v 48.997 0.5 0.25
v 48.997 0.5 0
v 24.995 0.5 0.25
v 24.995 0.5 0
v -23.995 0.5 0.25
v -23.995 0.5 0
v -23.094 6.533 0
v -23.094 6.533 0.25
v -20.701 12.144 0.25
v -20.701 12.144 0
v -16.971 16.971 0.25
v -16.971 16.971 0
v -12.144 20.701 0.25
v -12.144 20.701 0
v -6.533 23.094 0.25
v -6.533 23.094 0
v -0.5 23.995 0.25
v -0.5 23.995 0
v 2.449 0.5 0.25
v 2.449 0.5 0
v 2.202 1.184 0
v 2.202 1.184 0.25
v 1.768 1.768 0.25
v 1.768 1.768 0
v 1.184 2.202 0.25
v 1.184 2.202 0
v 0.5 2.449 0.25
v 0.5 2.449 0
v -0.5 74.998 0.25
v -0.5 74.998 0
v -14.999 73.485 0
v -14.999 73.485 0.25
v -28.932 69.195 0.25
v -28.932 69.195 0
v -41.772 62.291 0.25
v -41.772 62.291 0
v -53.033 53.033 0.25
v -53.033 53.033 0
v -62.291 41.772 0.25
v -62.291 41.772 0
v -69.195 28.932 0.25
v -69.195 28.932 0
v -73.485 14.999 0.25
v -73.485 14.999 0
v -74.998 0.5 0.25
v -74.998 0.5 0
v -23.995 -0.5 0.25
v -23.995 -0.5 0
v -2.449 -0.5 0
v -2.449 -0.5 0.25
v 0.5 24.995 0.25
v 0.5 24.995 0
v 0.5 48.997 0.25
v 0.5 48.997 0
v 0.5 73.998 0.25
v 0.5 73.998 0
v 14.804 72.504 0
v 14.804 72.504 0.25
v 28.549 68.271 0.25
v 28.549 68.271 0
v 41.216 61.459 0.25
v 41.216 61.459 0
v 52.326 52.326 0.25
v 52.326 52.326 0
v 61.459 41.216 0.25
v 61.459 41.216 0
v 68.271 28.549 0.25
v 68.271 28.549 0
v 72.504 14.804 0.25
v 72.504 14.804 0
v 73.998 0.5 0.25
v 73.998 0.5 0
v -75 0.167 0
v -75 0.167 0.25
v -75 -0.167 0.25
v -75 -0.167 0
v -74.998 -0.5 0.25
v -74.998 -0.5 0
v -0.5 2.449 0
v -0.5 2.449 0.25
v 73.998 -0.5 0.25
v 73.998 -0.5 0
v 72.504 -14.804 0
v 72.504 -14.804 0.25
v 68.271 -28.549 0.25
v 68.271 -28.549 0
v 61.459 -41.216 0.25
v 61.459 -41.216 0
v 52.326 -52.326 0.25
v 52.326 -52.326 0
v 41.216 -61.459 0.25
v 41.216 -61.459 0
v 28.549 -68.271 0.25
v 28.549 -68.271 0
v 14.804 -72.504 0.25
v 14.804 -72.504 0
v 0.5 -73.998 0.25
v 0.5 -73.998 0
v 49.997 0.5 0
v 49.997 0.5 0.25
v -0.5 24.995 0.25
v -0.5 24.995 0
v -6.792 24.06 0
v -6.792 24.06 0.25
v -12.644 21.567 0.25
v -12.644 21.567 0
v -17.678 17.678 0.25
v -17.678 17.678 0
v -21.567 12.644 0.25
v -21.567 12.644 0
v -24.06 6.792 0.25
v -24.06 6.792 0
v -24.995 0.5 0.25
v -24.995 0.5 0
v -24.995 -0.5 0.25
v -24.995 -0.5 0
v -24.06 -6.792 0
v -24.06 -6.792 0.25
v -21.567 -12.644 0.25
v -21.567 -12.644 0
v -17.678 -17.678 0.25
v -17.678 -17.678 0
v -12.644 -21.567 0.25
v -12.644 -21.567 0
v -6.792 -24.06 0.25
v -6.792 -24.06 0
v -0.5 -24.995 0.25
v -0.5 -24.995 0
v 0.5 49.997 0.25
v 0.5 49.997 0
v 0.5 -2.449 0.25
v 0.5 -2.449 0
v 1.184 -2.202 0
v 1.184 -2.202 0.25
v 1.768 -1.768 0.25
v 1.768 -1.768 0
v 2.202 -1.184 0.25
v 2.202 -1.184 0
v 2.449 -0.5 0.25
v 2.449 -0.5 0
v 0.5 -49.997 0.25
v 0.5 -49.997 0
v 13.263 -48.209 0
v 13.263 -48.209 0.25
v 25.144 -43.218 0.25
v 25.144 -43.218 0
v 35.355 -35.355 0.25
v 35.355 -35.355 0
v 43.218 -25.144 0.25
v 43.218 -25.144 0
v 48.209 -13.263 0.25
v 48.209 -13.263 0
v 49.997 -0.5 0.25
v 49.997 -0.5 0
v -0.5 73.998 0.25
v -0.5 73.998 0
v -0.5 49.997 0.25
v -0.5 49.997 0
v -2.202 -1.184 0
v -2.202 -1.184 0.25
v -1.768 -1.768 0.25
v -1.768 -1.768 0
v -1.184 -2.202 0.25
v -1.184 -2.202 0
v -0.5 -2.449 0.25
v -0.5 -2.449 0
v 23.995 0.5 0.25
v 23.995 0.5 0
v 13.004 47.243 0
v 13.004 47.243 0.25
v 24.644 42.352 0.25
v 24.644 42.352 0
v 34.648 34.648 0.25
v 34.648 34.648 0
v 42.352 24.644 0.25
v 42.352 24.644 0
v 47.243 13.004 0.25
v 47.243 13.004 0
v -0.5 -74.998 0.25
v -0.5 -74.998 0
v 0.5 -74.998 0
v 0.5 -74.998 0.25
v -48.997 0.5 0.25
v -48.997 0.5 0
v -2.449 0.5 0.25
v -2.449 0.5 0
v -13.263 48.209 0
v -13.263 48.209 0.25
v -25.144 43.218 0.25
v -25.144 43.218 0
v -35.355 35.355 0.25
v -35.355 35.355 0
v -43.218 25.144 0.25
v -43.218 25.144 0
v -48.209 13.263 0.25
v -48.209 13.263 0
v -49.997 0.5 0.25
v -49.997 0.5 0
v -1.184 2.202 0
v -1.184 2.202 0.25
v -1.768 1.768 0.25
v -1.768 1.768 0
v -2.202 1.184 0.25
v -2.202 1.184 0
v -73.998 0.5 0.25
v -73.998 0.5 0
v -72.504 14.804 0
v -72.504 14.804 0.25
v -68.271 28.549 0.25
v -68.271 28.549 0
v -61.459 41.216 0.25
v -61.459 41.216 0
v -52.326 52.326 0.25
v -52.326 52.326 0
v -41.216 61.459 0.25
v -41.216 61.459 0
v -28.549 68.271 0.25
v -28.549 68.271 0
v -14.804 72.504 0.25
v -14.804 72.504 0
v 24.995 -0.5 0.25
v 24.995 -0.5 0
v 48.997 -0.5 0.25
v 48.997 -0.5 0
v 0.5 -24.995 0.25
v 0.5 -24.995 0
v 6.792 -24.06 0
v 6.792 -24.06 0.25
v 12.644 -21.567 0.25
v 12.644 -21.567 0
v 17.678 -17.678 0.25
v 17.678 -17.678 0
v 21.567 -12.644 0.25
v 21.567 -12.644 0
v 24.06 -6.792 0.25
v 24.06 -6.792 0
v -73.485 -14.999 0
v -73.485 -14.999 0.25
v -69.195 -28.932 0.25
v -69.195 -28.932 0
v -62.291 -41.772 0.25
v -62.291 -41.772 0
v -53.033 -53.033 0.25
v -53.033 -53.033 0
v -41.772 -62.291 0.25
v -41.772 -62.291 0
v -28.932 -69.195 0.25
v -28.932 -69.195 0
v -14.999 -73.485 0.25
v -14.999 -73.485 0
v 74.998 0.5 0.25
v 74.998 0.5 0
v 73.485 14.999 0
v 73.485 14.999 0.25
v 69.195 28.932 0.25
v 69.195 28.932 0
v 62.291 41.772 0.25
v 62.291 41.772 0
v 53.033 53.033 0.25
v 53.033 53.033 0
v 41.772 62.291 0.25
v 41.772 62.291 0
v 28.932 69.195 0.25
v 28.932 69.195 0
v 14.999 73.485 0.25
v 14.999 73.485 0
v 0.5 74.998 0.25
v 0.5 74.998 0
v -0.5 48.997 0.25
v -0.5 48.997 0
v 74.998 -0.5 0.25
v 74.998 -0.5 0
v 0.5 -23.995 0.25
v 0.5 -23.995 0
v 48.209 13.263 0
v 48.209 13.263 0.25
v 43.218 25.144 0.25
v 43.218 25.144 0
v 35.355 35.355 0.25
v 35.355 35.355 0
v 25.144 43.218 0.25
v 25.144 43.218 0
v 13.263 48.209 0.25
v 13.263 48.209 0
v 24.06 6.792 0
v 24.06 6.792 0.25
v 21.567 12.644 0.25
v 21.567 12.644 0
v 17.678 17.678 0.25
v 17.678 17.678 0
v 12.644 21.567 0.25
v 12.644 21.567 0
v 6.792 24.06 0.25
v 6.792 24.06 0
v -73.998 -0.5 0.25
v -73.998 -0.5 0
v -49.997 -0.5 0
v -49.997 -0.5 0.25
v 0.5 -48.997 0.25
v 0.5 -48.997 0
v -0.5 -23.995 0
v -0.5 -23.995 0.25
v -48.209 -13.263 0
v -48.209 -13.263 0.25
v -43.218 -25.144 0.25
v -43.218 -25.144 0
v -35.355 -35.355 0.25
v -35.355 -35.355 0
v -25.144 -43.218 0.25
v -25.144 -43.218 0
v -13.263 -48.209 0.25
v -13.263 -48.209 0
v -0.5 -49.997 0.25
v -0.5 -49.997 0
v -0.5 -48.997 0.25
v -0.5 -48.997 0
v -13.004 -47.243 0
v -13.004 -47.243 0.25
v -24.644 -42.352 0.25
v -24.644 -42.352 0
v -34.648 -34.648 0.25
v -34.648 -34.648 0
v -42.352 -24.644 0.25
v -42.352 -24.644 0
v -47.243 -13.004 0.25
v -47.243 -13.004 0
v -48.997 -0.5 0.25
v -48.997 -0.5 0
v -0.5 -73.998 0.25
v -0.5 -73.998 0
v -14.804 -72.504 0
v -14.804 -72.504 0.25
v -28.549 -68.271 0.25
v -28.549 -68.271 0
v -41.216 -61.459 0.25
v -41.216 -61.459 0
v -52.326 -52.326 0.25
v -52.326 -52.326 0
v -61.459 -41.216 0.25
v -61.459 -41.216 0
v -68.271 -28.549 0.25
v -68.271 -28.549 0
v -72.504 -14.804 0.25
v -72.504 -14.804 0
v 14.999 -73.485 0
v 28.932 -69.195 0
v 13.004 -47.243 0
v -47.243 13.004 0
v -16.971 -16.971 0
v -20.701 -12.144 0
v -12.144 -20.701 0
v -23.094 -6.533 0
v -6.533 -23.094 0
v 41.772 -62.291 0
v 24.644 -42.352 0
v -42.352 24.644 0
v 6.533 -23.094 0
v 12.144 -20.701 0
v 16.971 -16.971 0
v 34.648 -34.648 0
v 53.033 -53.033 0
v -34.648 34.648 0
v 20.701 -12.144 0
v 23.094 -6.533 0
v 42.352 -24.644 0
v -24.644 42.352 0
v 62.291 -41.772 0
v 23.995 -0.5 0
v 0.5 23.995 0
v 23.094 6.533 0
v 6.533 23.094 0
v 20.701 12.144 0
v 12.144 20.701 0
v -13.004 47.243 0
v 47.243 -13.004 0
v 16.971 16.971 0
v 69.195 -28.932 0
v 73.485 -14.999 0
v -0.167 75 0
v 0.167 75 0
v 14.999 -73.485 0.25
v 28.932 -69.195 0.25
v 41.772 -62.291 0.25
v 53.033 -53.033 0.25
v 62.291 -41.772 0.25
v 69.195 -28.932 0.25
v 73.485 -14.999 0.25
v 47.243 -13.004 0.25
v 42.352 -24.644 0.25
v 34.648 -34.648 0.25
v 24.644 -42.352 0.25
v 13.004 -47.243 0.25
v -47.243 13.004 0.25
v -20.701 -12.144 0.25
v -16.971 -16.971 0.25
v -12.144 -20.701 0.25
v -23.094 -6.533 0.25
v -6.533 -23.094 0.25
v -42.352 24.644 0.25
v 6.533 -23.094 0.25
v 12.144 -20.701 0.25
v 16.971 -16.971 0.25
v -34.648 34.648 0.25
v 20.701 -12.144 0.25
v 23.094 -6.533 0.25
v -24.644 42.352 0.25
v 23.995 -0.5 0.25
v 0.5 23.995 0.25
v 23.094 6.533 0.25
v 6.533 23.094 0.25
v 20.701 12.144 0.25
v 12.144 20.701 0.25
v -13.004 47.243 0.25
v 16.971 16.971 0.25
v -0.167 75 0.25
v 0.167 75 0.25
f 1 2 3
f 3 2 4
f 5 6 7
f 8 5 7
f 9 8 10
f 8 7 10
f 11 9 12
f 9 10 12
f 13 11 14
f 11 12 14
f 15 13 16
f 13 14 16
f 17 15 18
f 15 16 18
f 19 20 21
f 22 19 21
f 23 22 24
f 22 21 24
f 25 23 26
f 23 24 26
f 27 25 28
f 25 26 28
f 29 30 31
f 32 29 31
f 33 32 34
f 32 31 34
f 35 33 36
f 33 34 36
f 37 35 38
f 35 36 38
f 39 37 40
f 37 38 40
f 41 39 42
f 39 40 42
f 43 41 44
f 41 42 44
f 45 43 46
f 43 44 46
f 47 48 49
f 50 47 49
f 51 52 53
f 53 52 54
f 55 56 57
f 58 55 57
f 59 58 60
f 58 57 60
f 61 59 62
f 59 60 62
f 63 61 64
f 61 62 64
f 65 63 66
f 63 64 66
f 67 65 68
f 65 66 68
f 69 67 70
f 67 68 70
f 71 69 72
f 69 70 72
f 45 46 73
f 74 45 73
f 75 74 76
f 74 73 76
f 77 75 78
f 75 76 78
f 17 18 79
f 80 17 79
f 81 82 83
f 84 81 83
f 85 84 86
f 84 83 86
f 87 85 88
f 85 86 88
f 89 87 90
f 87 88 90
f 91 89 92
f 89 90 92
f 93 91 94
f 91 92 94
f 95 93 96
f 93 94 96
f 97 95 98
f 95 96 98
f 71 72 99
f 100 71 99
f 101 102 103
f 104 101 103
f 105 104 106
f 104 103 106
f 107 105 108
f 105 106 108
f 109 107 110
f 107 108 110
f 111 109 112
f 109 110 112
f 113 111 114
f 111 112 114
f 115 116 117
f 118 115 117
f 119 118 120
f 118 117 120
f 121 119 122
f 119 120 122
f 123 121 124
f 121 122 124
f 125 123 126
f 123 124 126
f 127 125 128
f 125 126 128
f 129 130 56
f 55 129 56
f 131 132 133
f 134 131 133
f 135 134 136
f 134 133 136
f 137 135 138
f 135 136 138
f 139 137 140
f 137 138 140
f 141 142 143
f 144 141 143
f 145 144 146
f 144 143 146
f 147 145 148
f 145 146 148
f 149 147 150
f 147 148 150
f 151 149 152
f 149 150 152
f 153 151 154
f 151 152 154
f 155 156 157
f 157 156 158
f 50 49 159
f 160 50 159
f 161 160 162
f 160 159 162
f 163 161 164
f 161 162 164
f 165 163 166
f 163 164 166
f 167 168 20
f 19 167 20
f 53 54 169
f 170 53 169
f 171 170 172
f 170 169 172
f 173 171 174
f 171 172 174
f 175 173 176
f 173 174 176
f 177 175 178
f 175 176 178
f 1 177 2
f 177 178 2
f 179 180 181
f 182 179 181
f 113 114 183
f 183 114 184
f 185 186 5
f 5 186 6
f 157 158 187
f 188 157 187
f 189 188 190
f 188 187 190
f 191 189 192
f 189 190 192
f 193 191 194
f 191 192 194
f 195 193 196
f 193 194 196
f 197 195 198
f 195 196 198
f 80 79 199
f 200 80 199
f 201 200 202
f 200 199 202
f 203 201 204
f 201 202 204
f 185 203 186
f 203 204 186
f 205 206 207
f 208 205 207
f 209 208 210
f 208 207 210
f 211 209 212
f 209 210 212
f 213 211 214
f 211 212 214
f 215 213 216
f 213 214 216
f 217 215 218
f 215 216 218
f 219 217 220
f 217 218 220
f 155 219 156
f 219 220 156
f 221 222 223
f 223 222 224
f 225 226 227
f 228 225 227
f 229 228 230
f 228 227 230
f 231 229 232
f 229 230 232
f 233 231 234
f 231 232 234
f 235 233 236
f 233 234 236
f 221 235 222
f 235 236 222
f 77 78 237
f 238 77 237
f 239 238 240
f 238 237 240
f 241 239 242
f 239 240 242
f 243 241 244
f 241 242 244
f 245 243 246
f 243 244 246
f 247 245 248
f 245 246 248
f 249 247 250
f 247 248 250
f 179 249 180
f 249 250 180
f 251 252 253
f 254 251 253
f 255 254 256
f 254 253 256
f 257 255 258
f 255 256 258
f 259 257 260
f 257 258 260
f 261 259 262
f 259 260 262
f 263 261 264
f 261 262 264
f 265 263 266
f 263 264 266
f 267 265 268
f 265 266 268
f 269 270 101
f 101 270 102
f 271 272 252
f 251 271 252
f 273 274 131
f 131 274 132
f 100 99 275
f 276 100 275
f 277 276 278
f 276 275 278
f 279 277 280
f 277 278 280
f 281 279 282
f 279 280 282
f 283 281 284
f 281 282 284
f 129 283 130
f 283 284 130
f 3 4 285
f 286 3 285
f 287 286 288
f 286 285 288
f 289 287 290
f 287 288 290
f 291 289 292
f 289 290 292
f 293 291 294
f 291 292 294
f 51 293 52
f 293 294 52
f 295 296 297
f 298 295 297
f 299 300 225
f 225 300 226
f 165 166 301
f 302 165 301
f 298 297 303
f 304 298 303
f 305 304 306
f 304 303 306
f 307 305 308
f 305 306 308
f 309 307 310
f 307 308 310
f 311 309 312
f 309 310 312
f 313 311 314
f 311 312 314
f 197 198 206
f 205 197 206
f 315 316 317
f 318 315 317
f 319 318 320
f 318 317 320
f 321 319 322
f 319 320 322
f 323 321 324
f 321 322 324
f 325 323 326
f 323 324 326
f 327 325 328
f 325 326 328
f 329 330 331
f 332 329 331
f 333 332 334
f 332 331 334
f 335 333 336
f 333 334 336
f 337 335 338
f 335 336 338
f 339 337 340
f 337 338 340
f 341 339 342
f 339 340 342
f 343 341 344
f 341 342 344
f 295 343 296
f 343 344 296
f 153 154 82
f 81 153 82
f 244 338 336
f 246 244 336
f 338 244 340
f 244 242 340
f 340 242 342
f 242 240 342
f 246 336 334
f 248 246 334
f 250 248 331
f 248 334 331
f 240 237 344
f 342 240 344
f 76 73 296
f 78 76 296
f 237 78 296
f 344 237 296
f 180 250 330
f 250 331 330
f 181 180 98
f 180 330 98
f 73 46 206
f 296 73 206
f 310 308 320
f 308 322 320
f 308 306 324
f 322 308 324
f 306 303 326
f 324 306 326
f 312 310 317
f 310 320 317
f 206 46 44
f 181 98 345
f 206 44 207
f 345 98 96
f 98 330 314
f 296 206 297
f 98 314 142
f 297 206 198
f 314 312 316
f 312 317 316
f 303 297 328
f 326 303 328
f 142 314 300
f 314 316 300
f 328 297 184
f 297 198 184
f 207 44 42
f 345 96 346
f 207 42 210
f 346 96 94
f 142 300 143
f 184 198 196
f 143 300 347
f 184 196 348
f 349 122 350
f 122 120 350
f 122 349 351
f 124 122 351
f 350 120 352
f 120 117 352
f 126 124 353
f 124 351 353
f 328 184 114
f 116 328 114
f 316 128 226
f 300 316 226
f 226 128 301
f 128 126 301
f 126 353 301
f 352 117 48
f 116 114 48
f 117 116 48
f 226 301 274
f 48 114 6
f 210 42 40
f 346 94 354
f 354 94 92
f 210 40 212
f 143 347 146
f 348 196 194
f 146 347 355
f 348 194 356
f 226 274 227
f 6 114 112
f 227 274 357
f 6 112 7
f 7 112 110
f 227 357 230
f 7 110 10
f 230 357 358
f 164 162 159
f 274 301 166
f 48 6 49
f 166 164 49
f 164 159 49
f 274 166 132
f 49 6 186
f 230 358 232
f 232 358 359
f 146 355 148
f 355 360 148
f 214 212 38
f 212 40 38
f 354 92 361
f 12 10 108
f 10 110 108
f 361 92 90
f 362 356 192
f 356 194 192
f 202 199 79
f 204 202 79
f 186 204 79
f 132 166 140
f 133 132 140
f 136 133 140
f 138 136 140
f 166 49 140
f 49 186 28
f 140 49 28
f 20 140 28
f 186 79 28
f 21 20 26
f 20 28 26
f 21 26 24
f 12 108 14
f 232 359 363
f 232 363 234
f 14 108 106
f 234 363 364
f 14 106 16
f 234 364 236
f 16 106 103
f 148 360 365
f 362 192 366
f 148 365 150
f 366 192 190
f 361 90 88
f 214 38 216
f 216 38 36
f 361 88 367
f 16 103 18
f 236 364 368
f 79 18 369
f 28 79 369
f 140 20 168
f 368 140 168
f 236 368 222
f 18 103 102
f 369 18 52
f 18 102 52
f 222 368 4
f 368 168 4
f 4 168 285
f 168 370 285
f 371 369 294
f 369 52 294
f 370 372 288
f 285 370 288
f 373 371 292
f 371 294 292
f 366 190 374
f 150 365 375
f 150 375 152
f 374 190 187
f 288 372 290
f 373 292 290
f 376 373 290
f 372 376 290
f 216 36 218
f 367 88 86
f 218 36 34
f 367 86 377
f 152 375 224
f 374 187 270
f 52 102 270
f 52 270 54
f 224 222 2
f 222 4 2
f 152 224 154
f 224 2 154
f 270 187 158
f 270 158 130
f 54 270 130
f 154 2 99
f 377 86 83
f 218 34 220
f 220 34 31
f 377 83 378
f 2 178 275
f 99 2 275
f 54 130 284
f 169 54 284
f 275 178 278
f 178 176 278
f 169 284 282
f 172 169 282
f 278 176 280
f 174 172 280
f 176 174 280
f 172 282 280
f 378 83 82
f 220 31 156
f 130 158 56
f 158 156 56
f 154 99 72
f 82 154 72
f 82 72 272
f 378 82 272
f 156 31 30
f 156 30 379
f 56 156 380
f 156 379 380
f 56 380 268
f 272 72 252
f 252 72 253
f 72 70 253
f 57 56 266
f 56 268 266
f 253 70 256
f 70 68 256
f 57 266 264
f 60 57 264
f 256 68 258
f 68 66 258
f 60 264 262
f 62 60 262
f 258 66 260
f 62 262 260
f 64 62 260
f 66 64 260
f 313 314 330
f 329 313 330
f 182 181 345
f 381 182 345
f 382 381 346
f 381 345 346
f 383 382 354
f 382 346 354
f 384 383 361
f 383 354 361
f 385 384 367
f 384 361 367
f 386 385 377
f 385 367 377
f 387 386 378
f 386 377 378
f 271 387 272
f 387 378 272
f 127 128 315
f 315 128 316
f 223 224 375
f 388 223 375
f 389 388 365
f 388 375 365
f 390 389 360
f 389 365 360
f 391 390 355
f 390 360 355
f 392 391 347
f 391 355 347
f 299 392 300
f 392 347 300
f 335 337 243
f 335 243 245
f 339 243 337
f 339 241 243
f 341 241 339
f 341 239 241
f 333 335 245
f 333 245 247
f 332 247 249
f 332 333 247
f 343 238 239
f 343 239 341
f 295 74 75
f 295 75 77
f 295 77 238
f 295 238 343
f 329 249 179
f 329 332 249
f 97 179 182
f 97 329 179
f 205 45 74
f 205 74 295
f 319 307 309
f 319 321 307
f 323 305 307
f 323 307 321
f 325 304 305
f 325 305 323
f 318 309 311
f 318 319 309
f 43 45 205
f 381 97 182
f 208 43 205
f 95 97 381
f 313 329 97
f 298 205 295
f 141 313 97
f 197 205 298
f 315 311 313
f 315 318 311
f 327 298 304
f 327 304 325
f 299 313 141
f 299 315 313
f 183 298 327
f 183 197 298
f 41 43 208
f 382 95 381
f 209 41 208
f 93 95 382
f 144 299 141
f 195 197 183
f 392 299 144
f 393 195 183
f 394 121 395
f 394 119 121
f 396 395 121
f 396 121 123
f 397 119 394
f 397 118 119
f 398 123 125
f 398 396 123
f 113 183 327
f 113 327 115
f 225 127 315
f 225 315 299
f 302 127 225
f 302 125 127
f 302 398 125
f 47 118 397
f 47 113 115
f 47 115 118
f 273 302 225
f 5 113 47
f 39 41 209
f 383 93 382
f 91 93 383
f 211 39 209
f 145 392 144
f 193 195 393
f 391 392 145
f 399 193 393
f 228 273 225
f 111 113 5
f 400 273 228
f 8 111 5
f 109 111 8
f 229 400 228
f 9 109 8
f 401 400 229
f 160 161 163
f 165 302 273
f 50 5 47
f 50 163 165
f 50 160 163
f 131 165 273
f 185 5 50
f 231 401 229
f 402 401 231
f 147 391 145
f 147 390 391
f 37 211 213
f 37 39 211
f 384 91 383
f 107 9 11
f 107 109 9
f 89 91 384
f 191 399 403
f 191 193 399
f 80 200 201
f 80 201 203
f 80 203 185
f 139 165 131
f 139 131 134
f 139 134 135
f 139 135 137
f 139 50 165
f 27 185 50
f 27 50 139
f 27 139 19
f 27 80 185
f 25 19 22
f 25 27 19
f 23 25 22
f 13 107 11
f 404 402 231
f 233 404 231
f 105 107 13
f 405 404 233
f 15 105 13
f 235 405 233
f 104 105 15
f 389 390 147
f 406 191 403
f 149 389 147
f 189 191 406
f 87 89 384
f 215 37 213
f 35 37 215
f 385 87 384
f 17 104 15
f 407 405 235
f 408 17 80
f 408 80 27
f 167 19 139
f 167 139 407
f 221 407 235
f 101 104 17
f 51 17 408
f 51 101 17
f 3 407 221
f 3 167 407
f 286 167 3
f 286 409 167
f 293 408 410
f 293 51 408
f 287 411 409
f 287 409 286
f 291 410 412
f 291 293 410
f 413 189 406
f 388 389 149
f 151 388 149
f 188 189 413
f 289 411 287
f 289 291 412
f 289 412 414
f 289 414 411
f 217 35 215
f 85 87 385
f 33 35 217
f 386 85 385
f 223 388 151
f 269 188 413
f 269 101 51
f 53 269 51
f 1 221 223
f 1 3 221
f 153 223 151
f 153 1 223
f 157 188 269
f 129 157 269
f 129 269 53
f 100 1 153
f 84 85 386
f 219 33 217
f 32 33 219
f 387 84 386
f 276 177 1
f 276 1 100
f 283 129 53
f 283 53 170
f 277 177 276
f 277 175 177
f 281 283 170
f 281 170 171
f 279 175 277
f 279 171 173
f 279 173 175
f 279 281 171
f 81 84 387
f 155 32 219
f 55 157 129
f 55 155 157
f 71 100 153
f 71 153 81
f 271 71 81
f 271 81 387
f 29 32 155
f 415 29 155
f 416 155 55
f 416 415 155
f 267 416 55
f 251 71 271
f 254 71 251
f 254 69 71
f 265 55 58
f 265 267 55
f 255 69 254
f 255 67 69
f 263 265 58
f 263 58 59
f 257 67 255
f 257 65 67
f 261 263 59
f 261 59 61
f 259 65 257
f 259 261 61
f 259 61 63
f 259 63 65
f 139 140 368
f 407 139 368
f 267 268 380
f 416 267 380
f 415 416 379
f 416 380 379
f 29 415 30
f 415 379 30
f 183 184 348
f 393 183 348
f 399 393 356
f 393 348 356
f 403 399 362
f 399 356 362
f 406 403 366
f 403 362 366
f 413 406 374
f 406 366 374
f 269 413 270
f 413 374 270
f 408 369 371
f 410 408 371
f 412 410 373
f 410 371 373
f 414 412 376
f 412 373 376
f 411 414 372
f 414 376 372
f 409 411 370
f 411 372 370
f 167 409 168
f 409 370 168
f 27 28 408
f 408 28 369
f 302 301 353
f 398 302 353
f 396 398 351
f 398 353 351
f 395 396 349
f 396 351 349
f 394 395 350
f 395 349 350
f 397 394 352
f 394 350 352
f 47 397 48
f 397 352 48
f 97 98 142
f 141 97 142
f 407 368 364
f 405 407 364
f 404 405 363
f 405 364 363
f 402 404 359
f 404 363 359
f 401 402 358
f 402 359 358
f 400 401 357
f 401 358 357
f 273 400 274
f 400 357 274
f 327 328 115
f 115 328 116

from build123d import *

# Parameters (mm, degrees)
F1_DEPTH = 0.25


with BuildPart() as f1:
    # F0 (on Top) → F1 (new body)
    with BuildSketch(Plane.XY):
        with BuildLine():
            ThreePointArc((-0.5, -73.9983107915), (-52.3259018078, -52.3259018078), (-73.9983107915, -0.5))
            Line((-73.9983107915, -0.5), (-49.9974999375, -0.5))
            Line((-49.9974999375, -0.5), (-48.9974489132, -0.5))
            ThreePointArc((-48.9974489132, -0.5), (-49, 0), (-48.9974489132, 0.5))
            ThreePointArc((-48.9974489132, 0.5), (-34.6482322781, 34.6482322781), (-0.5, 48.9974489132))
            Line((-0.5, 48.9974489132), (-0.5, 49.9974999375))
            ThreePointArc((-0.5, 49.9974999375), (-35.3553390593, 35.3553390593), (-49.9974999375, 0.5))
            Line((-49.9974999375, 0.5), (-73.9983107915, 0.5))
            ThreePointArc((-73.9983107915, 0.5), (-52.3259018078, 52.3259018078), (-0.5, 73.9983107915))
            Line((-0.5, 73.9983107915), (-0.5, 74.9983333148))
            ThreePointArc((-0.5, 74.9983333148), (-53.033008589, 53.033008589), (-74.9983333148, 0.5))
            Line((-74.9983333148, 0.5), (-74.9983333148, -0.5))
            ThreePointArc((-74.9983333148, -0.5), (-53.033008589, -53.033008589), (-0.5, -74.9983333148))
            Line((-0.5, -74.9983333148), (-0.5, -73.9983107915))
        make_face()
        with BuildLine():
            Line((-0.5, -49.9974999375), (-0.5, -73.9983107915))
            ThreePointArc((-0.5, -73.9983107915), (0, -74), (0.5, -73.9983107915))
            Line((0.5, -73.9983107915), (0.5, -49.9974999375))
            ThreePointArc((0.5, -49.9974999375), (0, -50), (-0.5, -49.9974999375))
        make_face()
        with BuildLine():
            ThreePointArc((0.5, -73.9983107915), (0, -74), (-0.5, -73.9983107915))
            Line((-0.5, -73.9983107915), (-0.5, -74.9983333148))
            Line((-0.5, -74.9983333148), (0.5, -74.9983333148))
            Line((0.5, -74.9983333148), (0.5, -73.9983107915))
        make_face()
        with BuildLine():
            Line((-48.9974489132, -0.5), (-49.9974999375, -0.5))
            ThreePointArc((-49.9974999375, -0.5), (-35.3553390593, -35.3553390593), (-0.5, -49.9974999375))
            ThreePointArc((-0.5, -49.9974999375), (0, -50), (0.5, -49.9974999375))
            Line((0.5, -49.9974999375), (0.5, -48.9974489132))
            ThreePointArc((0.5, -48.9974489132), (0, -49), (-0.5, -48.9974489132))
            ThreePointArc((-0.5, -48.9974489132), (-34.6482322781, -34.6482322781), (-48.9974489132, -0.5))
        make_face()
        with BuildLine():
            ThreePointArc((73.9983107915, -0.5), (52.3259018078, -52.3259018078), (0.5, -73.9983107915))
            Line((0.5, -73.9983107915), (0.5, -74.9983333148))
            ThreePointArc((0.5, -74.9983333148), (53.033008589, -53.033008589), (74.9983333148, -0.5))
            Line((74.9983333148, -0.5), (73.9983107915, -0.5))
        make_face()
        with BuildLine():
            ThreePointArc((-48.9974489132, 0.5), (-49, 0), (-48.9974489132, -0.5))
            Line((-48.9974489132, -0.5), (-24.9949994999, -0.5))
            Line((-24.9949994999, -0.5), (-23.9947911014, -0.5))
            ThreePointArc((-23.9947911014, -0.5), (-24, 0), (-23.9947911014, 0.5))
            ThreePointArc((-23.9947911014, 0.5), (-16.9705627485, 16.9705627485), (-0.5, 23.9947911014))
            Line((-0.5, 23.9947911014), (-0.5, 24.9949994999))
            ThreePointArc((-0.5, 24.9949994999), (-17.6776695297, 17.6776695297), (-24.9949994999, 0.5))
            Line((-24.9949994999, 0.5), (-48.9974489132, 0.5))
        make_face()
        with BuildLine():
            Line((49.9974999375, -0.5), (73.9983107915, -0.5))
            ThreePointArc((73.9983107915, -0.5), (74, 0), (73.9983107915, 0.5))
            Line((73.9983107915, 0.5), (49.9974999375, 0.5))
            ThreePointArc((49.9974999375, 0.5), (50, 0), (49.9974999375, -0.5))
        make_face()
        with BuildLine():
            ThreePointArc((73.9983107915, 0.5), (74, 0), (73.9983107915, -0.5))
            Line((73.9983107915, -0.5), (74.9983333148, -0.5))
            Line((74.9983333148, -0.5), (74.9983333148, 0.5))
            Line((74.9983333148, 0.5), (73.9983107915, 0.5))
        make_face()
        with BuildLine():
            Line((0.5, -48.9974489132), (0.5, -49.9974999375))
            ThreePointArc((0.5, -49.9974999375), (35.3553390593, -35.3553390593), (49.9974999375, -0.5))
            Line((49.9974999375, -0.5), (48.9974489132, -0.5))
            ThreePointArc((48.9974489132, -0.5), (34.6482322781, -34.6482322781), (0.5, -48.9974489132))
        make_face()
        with BuildLine():
            ThreePointArc((-74.9983333148, 0.5), (-75, 0), (-74.9983333148, -0.5))
            Line((-74.9983333148, -0.5), (-74.9983333148, 0.5))
        make_face()
        with BuildLine():
            Line((-23.9947911014, -0.5), (-24.9949994999, -0.5))
            ThreePointArc((-24.9949994999, -0.5), (-17.6776695297, -17.6776695297), (-0.5, -24.9949994999))
            Line((-0.5, -24.9949994999), (-0.5, -48.9974489132))
            ThreePointArc((-0.5, -48.9974489132), (0, -49), (0.5, -48.9974489132))
            Line((0.5, -48.9974489132), (0.5, -24.9949994999))
            Line((0.5, -24.9949994999), (0.5, -23.9947911014))
            Line((0.5, -23.9947911014), (0.5, -2.4494897428))
            Line((0.5, -2.4494897428), (0.5, -0.5))
            Line((0.5, -0.5), (2.4494897428, -0.5))
            Line((2.4494897428, -0.5), (23.9947911014, -0.5))
            Line((23.9947911014, -0.5), (24.9949994999, -0.5))
            ThreePointArc((24.9949994999, -0.5), (25, 0), (24.9949994999, 0.5))
            Line((24.9949994999, 0.5), (23.9947911014, 0.5))
            Line((23.9947911014, 0.5), (2.4494897428, 0.5))
            Line((2.4494897428, 0.5), (0.5, 0.5))
            Line((0.5, 0.5), (-0.5, 0.5))
            Line((-0.5, 0.5), (-0.5, -0.5))
            Line((-0.5, -0.5), (-0.5, -2.4494897428))
            Line((-0.5, -2.4494897428), (-0.5, -23.9947911014))
            ThreePointArc((-0.5, -23.9947911014), (-16.9705627485, -16.9705627485), (-23.9947911014, -0.5))
        make_face()
        with BuildLine():
            ThreePointArc((0.5, 73.9983107915), (52.3259018078, 52.3259018078), (73.9983107915, 0.5))
            Line((73.9983107915, 0.5), (74.9983333148, 0.5))
            ThreePointArc((74.9983333148, 0.5), (53.033008589, 53.033008589), (0.5, 74.9983333148))
            Line((0.5, 74.9983333148), (0.5, 73.9983107915))
        make_face()
        with BuildLine():
            Line((48.9974489132, -0.5), (49.9974999375, -0.5))
            ThreePointArc((49.9974999375, -0.5), (50, 0), (49.9974999375, 0.5))
            Line((49.9974999375, 0.5), (48.9974489132, 0.5))
            ThreePointArc((48.9974489132, 0.5), (49, 0), (48.9974489132, -0.5))
        make_face()
        with BuildLine():
            Line((-0.5, 49.9974999375), (-0.5, 48.9974489132))
            ThreePointArc((-0.5, 48.9974489132), (0, 49), (0.5, 48.9974489132))
            Line((0.5, 48.9974489132), (0.5, 49.9974999375))
            ThreePointArc((0.5, 49.9974999375), (0, 50), (-0.5, 49.9974999375))
        make_face()
        with BuildLine():
            ThreePointArc((0.5, 48.9974489132), (0, 49), (-0.5, 48.9974489132))
            Line((-0.5, 48.9974489132), (-0.5, 24.9949994999))
            Line((-0.5, 24.9949994999), (-0.5, 23.9947911014))
            ThreePointArc((-0.5, 23.9947911014), (0, 24), (0.5, 23.9947911014))
            ThreePointArc((0.5, 23.9947911014), (16.9705627485, 16.9705627485), (23.9947911014, 0.5))
            Line((23.9947911014, 0.5), (24.9949994999, 0.5))
            ThreePointArc((24.9949994999, 0.5), (17.6776695297, 17.6776695297), (0.5, 24.9949994999))
            Line((0.5, 24.9949994999), (0.5, 48.9974489132))
        make_face()
        with BuildLine():
            ThreePointArc((-23.9947911014, 0.5), (-24, 0), (-23.9947911014, -0.5))
            Line((-23.9947911014, -0.5), (-2.4494897428, -0.5))
            Line((-2.4494897428, -0.5), (-0.5, -0.5))
            Line((-0.5, -0.5), (-0.5, 0.5))
            Line((-0.5, 0.5), (-2.4494897428, 0.5))
            Line((-2.4494897428, 0.5), (-23.9947911014, 0.5))
        make_face()
        with BuildLine():
            Line((0.5, 49.9974999375), (0.5, 73.9983107915))
            ThreePointArc((0.5, 73.9983107915), (0, 74), (-0.5, 73.9983107915))
            Line((-0.5, 73.9983107915), (-0.5, 49.9974999375))
            ThreePointArc((-0.5, 49.9974999375), (0, 50), (0.5, 49.9974999375))
        make_face()
        with BuildLine():
            ThreePointArc((-0.5, 73.9983107915), (0, 74), (0.5, 73.9983107915))
            Line((0.5, 73.9983107915), (0.5, 74.9983333148))
            Line((0.5, 74.9983333148), (-0.5, 74.9983333148))
            Line((-0.5, 74.9983333148), (-0.5, 73.9983107915))
        make_face()
        with BuildLine():
            Line((48.9974489132, 0.5), (49.9974999375, 0.5))
            ThreePointArc((49.9974999375, 0.5), (35.3553390593, 35.3553390593), (0.5, 49.9974999375))
            Line((0.5, 49.9974999375), (0.5, 48.9974489132))
            ThreePointArc((0.5, 48.9974489132), (34.6482322781, 34.6482322781), (48.9974489132, 0.5))
        make_face()
        with BuildLine():
            Line((24.9949994999, -0.5), (48.9974489132, -0.5))
            ThreePointArc((48.9974489132, -0.5), (49, 0), (48.9974489132, 0.5))
            Line((48.9974489132, 0.5), (24.9949994999, 0.5))
            ThreePointArc((24.9949994999, 0.5), (25, 0), (24.9949994999, -0.5))
        make_face()
        with BuildLine():
            Line((0.5, -23.9947911014), (0.5, -24.9949994999))
            ThreePointArc((0.5, -24.9949994999), (17.6776695297, -17.6776695297), (24.9949994999, -0.5))
            Line((24.9949994999, -0.5), (23.9947911014, -0.5))
            ThreePointArc((23.9947911014, -0.5), (16.9705627485, -16.9705627485), (0.5, -23.9947911014))
        make_face()
        with BuildLine():
            ThreePointArc((0.5, 74.9983333148), (0, 75), (-0.5, 74.9983333148))
            Line((-0.5, 74.9983333148), (0.5, 74.9983333148))
        make_face()
        with BuildLine():
            Line((-0.5, -0.5), (-2.4494897428, -0.5))
            ThreePointArc((-2.4494897428, -0.5), (-1.767766953, -1.767766953), (-0.5, -2.4494897428))
            Line((-0.5, -2.4494897428), (-0.5, -0.5))
        make_face()
        with BuildLine():
            ThreePointArc((0.5, 23.9947911014), (0, 24), (-0.5, 23.9947911014))
            Line((-0.5, 23.9947911014), (-0.5, 2.4494897428))
            Line((-0.5, 2.4494897428), (-0.5, 0.5))
            Line((-0.5, 0.5), (0.5, 0.5))
            Line((0.5, 0.5), (0.5, 2.4494897428))
            Line((0.5, 2.4494897428), (0.5, 23.9947911014))
        make_face()
        with BuildLine():
            ThreePointArc((-0.5, 2.4494897428), (-1.767766953, 1.767766953), (-2.4494897428, 0.5))
            Line((-2.4494897428, 0.5), (-0.5, 0.5))
            Line((-0.5, 0.5), (-0.5, 2.4494897428))
        make_face()
        with BuildLine():
            Line((0.5, -0.5), (0.5, -2.4494897428))
            ThreePointArc((0.5, -2.4494897428), (1.767766953, -1.767766953), (2.4494897428, -0.5))
            Line((2.4494897428, -0.5), (0.5, -0.5))
        make_face()
        with BuildLine():
            ThreePointArc((2.4494897428, 0.5), (1.767766953, 1.767766953), (0.5, 2.4494897428))
            Line((0.5, 2.4494897428), (0.5, 0.5))
            Line((0.5, 0.5), (2.4494897428, 0.5))
        make_face()
    extrude(amount=F1_DEPTH)


solid = f1.part
